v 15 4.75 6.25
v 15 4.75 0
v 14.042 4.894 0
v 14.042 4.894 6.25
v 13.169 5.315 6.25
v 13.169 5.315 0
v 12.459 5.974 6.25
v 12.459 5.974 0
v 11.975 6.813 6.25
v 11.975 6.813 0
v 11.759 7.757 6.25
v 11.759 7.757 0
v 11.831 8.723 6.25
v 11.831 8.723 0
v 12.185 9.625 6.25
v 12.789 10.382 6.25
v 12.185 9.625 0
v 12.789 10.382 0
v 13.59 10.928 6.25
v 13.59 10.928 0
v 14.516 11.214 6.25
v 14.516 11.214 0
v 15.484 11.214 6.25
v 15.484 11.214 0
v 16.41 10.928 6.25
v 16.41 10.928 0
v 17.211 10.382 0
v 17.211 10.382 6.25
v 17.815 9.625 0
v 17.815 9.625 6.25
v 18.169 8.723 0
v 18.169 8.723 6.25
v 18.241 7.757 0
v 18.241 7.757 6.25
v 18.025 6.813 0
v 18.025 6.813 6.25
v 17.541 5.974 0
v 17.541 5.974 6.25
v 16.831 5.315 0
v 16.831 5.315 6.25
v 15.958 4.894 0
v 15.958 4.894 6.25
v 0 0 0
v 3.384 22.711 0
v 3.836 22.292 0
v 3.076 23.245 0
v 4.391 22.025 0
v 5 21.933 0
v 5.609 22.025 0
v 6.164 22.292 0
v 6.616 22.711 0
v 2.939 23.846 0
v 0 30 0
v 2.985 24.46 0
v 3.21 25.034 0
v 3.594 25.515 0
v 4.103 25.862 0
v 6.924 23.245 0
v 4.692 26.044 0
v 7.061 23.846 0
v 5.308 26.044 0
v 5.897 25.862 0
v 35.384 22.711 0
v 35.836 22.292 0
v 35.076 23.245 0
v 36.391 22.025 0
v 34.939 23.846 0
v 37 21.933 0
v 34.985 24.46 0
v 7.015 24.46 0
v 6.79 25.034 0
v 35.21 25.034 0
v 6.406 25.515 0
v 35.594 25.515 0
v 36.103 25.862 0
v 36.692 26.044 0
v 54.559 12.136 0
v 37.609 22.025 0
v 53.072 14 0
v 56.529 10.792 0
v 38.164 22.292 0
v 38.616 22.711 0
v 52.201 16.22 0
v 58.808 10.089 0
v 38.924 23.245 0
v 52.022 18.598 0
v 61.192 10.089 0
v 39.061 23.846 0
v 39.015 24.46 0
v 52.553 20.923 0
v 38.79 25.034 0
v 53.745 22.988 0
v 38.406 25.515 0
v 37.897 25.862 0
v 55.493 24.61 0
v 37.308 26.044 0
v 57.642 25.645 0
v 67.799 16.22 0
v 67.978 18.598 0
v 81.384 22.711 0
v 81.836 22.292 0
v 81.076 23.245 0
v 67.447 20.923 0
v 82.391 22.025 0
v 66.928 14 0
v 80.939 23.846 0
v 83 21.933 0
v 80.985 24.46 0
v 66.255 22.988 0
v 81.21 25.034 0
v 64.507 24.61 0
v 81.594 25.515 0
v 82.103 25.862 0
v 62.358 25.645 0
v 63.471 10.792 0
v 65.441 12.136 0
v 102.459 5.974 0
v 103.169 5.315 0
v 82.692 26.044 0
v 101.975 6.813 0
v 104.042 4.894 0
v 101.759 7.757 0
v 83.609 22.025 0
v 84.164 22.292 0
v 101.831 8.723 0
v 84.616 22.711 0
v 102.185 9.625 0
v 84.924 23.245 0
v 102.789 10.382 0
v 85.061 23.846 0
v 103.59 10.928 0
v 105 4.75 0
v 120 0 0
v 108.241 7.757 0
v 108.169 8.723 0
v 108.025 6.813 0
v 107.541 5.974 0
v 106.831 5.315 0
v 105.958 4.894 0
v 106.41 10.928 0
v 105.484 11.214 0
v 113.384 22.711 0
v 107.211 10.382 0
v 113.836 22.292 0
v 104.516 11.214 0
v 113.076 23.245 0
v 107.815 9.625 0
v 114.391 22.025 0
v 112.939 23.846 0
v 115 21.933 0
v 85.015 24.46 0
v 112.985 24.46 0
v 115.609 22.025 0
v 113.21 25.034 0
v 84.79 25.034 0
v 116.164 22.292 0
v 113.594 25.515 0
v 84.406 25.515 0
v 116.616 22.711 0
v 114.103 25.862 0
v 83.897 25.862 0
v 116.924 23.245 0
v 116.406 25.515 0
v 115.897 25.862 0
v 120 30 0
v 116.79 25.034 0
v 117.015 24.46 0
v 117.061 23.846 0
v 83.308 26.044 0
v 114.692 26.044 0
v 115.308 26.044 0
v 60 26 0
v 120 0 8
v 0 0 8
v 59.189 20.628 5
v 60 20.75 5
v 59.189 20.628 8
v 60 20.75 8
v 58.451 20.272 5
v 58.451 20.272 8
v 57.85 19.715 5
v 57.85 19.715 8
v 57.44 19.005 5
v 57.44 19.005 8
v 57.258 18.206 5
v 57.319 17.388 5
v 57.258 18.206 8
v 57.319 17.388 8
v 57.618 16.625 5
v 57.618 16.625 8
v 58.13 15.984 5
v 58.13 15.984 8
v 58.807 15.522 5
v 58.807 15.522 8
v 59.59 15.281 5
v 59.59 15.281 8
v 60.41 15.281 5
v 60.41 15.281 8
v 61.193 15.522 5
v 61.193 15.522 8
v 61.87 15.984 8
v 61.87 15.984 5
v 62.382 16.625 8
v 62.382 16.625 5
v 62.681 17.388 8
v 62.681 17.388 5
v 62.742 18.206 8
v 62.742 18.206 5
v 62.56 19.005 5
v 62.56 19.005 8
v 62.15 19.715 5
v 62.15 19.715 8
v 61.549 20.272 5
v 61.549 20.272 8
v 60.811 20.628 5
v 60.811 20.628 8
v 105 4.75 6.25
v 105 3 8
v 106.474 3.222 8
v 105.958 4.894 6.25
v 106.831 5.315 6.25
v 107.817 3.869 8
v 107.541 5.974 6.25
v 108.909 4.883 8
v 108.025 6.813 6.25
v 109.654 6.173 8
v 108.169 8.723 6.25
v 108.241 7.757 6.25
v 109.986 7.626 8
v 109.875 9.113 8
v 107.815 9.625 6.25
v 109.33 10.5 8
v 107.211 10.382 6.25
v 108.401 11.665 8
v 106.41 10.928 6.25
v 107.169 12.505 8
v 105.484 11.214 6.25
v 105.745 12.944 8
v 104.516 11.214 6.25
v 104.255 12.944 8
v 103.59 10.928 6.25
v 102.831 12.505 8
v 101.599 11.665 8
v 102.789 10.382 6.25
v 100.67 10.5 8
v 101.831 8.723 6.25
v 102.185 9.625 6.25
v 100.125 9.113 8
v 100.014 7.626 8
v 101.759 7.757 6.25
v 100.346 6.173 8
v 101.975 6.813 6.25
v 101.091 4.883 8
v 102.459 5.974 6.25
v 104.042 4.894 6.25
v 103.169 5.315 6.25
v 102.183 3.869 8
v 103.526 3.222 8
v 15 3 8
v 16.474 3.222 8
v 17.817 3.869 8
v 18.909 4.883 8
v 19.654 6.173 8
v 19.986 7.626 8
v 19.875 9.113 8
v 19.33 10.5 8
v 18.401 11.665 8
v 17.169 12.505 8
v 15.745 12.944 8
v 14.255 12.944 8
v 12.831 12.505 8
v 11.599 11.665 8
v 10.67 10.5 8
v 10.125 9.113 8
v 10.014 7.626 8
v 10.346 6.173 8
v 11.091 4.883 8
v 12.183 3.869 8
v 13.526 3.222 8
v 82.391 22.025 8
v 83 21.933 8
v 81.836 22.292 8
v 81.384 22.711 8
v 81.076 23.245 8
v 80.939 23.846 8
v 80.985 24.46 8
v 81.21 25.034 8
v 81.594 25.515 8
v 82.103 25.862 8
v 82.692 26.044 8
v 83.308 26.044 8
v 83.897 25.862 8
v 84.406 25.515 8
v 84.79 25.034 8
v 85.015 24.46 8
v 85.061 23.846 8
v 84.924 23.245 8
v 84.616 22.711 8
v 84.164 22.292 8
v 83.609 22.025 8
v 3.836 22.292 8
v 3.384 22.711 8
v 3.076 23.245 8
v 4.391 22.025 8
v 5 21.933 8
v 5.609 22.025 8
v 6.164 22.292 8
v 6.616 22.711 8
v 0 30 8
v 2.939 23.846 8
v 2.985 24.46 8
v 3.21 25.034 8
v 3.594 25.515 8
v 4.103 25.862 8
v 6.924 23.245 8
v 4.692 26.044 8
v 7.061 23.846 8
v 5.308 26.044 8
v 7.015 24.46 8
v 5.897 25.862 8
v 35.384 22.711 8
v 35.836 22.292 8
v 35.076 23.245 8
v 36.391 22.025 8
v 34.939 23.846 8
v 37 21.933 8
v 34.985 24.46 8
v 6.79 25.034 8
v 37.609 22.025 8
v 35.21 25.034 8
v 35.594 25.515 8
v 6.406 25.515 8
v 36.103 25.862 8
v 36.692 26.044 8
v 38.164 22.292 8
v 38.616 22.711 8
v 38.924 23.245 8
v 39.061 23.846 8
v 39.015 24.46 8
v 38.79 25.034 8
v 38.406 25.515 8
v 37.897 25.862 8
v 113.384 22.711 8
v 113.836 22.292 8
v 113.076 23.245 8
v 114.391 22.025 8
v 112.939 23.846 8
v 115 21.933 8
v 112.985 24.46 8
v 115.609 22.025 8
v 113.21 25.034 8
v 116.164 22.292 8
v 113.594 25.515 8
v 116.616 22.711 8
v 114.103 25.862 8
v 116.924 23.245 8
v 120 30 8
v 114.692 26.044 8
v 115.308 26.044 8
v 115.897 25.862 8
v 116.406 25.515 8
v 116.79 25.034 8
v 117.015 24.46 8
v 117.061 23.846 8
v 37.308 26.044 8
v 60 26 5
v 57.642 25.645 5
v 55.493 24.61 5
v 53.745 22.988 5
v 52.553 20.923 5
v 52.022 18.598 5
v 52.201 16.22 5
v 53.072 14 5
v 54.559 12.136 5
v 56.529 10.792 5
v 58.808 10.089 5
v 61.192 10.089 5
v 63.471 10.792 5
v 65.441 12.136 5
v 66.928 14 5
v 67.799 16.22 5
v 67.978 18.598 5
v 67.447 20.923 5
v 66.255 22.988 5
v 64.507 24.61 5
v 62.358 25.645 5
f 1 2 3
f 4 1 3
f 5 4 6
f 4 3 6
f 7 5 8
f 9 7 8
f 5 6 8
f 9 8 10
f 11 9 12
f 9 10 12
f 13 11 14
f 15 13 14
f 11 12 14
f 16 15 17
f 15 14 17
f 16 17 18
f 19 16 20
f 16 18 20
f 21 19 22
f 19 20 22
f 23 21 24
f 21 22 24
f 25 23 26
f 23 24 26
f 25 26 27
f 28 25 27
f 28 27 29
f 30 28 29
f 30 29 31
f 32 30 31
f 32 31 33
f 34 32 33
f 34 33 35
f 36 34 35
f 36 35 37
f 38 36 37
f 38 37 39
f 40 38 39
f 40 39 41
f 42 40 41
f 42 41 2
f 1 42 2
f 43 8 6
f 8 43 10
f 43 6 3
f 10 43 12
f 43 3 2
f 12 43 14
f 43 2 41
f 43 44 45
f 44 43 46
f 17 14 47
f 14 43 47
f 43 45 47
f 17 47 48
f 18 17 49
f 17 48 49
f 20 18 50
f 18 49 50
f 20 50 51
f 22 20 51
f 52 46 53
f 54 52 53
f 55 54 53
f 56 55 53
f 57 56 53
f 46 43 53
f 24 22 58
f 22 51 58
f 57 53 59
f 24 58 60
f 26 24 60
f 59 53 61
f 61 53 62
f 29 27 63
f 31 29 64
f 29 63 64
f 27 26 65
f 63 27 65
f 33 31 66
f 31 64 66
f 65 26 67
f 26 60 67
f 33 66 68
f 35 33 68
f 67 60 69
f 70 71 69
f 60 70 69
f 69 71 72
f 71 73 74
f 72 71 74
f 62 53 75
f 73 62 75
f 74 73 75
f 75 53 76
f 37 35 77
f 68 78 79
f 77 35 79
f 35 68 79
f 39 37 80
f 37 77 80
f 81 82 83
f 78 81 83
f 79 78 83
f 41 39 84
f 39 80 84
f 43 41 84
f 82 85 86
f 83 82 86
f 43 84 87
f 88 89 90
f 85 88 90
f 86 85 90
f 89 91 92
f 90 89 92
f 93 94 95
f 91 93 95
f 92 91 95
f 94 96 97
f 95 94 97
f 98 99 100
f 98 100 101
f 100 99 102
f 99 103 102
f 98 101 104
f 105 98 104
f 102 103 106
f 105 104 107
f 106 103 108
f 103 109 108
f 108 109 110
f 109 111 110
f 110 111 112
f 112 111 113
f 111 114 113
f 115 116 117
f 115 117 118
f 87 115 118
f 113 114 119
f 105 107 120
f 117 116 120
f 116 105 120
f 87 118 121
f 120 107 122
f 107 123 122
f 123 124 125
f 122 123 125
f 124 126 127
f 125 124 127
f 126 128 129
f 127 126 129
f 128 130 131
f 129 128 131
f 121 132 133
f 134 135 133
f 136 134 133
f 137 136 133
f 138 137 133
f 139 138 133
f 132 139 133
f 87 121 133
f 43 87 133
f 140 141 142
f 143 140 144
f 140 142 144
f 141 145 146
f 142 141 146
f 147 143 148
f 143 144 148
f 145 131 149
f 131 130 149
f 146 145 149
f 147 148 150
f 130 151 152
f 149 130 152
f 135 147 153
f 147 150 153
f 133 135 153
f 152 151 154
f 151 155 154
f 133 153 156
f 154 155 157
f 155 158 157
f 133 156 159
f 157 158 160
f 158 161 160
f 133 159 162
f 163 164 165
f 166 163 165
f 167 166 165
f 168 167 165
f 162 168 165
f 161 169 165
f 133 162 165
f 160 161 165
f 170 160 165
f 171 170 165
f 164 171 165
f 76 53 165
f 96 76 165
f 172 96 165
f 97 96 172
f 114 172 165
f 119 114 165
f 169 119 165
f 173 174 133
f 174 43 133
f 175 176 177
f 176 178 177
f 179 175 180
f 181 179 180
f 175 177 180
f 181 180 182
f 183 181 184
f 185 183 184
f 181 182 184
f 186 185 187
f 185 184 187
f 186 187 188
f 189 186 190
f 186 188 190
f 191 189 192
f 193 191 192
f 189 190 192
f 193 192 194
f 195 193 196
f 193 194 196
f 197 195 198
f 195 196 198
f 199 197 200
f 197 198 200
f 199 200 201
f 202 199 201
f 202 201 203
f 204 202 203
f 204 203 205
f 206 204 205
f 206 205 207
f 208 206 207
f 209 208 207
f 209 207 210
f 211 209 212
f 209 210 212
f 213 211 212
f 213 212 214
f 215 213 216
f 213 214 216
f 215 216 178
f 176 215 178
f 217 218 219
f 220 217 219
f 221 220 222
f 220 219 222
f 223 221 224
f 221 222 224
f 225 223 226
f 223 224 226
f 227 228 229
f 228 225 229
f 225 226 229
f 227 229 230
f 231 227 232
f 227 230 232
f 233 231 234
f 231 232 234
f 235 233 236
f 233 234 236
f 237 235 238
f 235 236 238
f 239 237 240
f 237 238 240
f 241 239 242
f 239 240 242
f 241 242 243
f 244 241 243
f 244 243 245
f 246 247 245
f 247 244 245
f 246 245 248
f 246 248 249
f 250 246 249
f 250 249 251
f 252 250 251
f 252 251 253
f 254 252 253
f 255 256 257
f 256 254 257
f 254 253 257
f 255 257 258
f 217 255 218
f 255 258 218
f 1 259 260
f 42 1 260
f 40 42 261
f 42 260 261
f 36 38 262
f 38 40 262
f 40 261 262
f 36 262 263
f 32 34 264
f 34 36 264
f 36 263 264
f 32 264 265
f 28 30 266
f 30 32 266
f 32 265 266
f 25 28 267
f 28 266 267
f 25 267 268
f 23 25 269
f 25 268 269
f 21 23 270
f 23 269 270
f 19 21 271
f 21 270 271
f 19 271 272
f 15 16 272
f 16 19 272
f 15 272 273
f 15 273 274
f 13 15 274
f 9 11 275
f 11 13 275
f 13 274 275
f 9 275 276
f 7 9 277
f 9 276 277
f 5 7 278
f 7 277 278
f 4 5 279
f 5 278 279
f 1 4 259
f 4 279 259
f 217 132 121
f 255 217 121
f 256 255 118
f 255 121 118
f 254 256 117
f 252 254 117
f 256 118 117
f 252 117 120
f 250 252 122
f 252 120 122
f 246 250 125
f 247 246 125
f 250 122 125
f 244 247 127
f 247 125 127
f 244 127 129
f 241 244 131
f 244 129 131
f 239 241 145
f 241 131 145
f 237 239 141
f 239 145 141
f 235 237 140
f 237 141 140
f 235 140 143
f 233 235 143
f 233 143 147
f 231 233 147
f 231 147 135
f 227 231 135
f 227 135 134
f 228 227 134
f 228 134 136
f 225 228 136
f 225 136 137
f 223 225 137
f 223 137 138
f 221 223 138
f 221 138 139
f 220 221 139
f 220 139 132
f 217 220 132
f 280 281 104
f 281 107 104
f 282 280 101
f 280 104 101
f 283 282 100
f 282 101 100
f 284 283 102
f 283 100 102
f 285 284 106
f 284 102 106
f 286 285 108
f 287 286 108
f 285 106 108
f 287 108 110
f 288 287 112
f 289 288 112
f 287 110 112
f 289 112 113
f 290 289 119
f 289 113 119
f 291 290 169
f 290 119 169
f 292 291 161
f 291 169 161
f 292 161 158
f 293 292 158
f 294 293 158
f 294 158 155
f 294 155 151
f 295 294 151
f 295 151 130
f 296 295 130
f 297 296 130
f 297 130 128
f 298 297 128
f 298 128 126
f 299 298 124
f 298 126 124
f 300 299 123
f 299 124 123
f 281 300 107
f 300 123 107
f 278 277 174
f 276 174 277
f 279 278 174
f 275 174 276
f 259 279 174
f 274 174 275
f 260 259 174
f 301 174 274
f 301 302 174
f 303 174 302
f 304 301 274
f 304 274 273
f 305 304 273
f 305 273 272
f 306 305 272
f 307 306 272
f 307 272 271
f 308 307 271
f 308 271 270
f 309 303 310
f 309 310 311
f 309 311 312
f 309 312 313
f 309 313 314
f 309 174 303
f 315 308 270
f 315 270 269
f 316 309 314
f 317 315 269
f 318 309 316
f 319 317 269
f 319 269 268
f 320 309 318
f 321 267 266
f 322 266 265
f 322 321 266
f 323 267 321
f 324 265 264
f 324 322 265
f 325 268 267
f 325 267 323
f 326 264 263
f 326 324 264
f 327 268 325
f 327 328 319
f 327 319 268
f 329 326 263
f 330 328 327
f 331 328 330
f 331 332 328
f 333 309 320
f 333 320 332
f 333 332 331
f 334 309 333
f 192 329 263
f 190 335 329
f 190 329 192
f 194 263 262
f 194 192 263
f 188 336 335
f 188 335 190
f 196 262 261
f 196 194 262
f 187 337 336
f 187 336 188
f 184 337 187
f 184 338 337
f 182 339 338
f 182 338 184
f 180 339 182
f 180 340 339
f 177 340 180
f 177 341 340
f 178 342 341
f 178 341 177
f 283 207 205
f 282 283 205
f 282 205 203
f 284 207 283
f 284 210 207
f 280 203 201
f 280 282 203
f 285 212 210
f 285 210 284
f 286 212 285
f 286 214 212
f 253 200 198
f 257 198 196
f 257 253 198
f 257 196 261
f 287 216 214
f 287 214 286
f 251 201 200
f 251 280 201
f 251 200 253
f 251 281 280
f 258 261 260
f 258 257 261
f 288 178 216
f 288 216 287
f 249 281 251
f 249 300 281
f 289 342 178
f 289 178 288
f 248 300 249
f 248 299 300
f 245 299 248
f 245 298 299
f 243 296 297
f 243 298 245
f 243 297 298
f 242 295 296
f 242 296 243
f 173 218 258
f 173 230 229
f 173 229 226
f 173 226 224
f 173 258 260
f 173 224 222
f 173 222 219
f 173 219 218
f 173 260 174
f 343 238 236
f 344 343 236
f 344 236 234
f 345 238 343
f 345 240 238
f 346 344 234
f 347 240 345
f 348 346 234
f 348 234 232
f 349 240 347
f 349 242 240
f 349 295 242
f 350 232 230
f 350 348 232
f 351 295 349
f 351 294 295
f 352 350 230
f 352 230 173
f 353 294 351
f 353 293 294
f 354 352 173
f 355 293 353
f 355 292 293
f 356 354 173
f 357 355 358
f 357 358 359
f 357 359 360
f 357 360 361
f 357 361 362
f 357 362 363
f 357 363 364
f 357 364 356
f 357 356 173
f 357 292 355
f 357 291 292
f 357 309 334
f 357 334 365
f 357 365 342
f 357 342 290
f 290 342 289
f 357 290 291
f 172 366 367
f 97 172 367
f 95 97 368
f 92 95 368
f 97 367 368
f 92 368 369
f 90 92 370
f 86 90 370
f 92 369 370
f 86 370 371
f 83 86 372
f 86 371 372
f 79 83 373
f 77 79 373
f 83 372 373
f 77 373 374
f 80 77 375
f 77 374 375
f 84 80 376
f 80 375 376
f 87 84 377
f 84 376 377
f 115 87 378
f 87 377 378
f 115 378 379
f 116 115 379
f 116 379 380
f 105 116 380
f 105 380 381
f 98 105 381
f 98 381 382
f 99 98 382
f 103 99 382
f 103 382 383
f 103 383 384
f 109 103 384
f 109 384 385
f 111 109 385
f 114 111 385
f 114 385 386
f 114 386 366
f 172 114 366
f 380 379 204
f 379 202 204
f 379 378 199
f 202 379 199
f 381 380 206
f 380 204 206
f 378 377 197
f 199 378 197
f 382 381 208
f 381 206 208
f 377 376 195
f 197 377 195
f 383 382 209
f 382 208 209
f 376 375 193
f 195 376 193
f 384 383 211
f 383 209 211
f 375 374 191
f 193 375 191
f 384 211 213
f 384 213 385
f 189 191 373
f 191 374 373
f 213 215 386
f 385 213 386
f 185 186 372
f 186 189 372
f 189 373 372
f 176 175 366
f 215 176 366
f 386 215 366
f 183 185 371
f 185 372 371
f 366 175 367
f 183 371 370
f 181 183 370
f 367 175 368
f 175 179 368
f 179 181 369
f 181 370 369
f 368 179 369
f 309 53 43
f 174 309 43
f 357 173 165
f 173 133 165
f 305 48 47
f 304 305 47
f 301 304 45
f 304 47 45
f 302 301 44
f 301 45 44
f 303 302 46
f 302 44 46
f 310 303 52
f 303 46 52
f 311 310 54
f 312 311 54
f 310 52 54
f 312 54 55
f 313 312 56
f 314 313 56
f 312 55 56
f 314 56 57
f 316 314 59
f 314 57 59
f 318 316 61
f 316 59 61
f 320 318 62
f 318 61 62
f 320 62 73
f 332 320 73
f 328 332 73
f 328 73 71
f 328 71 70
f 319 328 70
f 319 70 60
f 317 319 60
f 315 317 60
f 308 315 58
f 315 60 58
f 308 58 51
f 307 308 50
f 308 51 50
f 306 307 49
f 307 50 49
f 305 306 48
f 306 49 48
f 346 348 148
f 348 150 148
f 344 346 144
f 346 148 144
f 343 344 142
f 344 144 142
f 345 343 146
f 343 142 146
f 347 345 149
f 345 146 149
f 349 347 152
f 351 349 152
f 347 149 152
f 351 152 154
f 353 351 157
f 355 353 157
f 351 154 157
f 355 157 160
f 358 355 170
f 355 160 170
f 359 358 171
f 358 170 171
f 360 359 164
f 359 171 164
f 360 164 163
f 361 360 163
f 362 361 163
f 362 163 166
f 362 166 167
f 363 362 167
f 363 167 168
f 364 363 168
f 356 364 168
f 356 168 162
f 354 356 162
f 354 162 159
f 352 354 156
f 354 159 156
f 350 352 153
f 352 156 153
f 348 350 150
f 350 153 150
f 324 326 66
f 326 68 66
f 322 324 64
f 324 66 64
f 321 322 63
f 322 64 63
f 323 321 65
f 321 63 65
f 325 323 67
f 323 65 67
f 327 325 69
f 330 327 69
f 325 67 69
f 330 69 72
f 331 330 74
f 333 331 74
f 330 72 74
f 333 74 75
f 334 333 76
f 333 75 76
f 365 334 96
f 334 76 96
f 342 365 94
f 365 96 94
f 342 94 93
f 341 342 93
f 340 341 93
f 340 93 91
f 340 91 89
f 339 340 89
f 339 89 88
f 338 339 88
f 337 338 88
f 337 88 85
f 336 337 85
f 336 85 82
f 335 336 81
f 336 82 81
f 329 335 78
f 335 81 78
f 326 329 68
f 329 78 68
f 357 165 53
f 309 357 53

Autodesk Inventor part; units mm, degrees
ref_plane "YZ Plane" through (0, 0, 0) normal (1, 0, 0) x (0, 1, 0)
ref_plane "XZ Plane" through (0, 0, 0) normal (0, 1, 0) x (-1, 0, 0)
ref_plane "XY Plane" through (0, 0, 0) normal (0, 0, 1) x (1, 0, 0)
sketch "Sketch1" plane through (0, 0, 0) normal (0, 0, 1) x (1, 0, 0)
  line L0 (0, 0) -> (120, 0)
  line L1 (120, 0) -> (120, 30)
  line L2 (120, 30) -> (0, 30)
  line L3 (0, 30) -> (0, 0)
  dimension "width" = 120
  dimension "d1" = 30
extrude "Extrusion1" add sketch "Sketch1" along normal blind 8
hole "Hole1" at (15, 8, 8) direction (0, 0, -1) diameter 6.5 end through all countersink diameter 10 countersink angle 90
hole "Hole2" at (105, 8, 8) direction (0, 0, -1) diameter 6.5 end through all countersink diameter 10 countersink angle 90
hole "Hole3" at (60, 18, 0) direction (0, 0, 1) diameter 16 depth 5
hole "Hole4" at (60, 18, 5) direction (0, 0, 1) diameter 5.5 end through all
hole "Hole5" at (5, 24, 8) direction (0, 0, -1) diameter 4.134 end through all thread size "M5x0.8" class "6H" standard "ANSI Metric M Profile"
hole "Hole6" at (115, 24, 8) direction (0, 0, -1) diameter 4.134 end through all thread size "M5x0.8" class "6H" standard "ANSI Metric M Profile"
pattern_linear "Rectangular Pattern1" count 2 spacing 32 along (1, 0, 0) of "Hole5"
pattern_linear "Rectangular Pattern2" count 2 spacing 32 along (-1, 0, 0) of "Hole6"
equation "\"d22\" = 0.5 * width"
properties part number "alu top plate"
